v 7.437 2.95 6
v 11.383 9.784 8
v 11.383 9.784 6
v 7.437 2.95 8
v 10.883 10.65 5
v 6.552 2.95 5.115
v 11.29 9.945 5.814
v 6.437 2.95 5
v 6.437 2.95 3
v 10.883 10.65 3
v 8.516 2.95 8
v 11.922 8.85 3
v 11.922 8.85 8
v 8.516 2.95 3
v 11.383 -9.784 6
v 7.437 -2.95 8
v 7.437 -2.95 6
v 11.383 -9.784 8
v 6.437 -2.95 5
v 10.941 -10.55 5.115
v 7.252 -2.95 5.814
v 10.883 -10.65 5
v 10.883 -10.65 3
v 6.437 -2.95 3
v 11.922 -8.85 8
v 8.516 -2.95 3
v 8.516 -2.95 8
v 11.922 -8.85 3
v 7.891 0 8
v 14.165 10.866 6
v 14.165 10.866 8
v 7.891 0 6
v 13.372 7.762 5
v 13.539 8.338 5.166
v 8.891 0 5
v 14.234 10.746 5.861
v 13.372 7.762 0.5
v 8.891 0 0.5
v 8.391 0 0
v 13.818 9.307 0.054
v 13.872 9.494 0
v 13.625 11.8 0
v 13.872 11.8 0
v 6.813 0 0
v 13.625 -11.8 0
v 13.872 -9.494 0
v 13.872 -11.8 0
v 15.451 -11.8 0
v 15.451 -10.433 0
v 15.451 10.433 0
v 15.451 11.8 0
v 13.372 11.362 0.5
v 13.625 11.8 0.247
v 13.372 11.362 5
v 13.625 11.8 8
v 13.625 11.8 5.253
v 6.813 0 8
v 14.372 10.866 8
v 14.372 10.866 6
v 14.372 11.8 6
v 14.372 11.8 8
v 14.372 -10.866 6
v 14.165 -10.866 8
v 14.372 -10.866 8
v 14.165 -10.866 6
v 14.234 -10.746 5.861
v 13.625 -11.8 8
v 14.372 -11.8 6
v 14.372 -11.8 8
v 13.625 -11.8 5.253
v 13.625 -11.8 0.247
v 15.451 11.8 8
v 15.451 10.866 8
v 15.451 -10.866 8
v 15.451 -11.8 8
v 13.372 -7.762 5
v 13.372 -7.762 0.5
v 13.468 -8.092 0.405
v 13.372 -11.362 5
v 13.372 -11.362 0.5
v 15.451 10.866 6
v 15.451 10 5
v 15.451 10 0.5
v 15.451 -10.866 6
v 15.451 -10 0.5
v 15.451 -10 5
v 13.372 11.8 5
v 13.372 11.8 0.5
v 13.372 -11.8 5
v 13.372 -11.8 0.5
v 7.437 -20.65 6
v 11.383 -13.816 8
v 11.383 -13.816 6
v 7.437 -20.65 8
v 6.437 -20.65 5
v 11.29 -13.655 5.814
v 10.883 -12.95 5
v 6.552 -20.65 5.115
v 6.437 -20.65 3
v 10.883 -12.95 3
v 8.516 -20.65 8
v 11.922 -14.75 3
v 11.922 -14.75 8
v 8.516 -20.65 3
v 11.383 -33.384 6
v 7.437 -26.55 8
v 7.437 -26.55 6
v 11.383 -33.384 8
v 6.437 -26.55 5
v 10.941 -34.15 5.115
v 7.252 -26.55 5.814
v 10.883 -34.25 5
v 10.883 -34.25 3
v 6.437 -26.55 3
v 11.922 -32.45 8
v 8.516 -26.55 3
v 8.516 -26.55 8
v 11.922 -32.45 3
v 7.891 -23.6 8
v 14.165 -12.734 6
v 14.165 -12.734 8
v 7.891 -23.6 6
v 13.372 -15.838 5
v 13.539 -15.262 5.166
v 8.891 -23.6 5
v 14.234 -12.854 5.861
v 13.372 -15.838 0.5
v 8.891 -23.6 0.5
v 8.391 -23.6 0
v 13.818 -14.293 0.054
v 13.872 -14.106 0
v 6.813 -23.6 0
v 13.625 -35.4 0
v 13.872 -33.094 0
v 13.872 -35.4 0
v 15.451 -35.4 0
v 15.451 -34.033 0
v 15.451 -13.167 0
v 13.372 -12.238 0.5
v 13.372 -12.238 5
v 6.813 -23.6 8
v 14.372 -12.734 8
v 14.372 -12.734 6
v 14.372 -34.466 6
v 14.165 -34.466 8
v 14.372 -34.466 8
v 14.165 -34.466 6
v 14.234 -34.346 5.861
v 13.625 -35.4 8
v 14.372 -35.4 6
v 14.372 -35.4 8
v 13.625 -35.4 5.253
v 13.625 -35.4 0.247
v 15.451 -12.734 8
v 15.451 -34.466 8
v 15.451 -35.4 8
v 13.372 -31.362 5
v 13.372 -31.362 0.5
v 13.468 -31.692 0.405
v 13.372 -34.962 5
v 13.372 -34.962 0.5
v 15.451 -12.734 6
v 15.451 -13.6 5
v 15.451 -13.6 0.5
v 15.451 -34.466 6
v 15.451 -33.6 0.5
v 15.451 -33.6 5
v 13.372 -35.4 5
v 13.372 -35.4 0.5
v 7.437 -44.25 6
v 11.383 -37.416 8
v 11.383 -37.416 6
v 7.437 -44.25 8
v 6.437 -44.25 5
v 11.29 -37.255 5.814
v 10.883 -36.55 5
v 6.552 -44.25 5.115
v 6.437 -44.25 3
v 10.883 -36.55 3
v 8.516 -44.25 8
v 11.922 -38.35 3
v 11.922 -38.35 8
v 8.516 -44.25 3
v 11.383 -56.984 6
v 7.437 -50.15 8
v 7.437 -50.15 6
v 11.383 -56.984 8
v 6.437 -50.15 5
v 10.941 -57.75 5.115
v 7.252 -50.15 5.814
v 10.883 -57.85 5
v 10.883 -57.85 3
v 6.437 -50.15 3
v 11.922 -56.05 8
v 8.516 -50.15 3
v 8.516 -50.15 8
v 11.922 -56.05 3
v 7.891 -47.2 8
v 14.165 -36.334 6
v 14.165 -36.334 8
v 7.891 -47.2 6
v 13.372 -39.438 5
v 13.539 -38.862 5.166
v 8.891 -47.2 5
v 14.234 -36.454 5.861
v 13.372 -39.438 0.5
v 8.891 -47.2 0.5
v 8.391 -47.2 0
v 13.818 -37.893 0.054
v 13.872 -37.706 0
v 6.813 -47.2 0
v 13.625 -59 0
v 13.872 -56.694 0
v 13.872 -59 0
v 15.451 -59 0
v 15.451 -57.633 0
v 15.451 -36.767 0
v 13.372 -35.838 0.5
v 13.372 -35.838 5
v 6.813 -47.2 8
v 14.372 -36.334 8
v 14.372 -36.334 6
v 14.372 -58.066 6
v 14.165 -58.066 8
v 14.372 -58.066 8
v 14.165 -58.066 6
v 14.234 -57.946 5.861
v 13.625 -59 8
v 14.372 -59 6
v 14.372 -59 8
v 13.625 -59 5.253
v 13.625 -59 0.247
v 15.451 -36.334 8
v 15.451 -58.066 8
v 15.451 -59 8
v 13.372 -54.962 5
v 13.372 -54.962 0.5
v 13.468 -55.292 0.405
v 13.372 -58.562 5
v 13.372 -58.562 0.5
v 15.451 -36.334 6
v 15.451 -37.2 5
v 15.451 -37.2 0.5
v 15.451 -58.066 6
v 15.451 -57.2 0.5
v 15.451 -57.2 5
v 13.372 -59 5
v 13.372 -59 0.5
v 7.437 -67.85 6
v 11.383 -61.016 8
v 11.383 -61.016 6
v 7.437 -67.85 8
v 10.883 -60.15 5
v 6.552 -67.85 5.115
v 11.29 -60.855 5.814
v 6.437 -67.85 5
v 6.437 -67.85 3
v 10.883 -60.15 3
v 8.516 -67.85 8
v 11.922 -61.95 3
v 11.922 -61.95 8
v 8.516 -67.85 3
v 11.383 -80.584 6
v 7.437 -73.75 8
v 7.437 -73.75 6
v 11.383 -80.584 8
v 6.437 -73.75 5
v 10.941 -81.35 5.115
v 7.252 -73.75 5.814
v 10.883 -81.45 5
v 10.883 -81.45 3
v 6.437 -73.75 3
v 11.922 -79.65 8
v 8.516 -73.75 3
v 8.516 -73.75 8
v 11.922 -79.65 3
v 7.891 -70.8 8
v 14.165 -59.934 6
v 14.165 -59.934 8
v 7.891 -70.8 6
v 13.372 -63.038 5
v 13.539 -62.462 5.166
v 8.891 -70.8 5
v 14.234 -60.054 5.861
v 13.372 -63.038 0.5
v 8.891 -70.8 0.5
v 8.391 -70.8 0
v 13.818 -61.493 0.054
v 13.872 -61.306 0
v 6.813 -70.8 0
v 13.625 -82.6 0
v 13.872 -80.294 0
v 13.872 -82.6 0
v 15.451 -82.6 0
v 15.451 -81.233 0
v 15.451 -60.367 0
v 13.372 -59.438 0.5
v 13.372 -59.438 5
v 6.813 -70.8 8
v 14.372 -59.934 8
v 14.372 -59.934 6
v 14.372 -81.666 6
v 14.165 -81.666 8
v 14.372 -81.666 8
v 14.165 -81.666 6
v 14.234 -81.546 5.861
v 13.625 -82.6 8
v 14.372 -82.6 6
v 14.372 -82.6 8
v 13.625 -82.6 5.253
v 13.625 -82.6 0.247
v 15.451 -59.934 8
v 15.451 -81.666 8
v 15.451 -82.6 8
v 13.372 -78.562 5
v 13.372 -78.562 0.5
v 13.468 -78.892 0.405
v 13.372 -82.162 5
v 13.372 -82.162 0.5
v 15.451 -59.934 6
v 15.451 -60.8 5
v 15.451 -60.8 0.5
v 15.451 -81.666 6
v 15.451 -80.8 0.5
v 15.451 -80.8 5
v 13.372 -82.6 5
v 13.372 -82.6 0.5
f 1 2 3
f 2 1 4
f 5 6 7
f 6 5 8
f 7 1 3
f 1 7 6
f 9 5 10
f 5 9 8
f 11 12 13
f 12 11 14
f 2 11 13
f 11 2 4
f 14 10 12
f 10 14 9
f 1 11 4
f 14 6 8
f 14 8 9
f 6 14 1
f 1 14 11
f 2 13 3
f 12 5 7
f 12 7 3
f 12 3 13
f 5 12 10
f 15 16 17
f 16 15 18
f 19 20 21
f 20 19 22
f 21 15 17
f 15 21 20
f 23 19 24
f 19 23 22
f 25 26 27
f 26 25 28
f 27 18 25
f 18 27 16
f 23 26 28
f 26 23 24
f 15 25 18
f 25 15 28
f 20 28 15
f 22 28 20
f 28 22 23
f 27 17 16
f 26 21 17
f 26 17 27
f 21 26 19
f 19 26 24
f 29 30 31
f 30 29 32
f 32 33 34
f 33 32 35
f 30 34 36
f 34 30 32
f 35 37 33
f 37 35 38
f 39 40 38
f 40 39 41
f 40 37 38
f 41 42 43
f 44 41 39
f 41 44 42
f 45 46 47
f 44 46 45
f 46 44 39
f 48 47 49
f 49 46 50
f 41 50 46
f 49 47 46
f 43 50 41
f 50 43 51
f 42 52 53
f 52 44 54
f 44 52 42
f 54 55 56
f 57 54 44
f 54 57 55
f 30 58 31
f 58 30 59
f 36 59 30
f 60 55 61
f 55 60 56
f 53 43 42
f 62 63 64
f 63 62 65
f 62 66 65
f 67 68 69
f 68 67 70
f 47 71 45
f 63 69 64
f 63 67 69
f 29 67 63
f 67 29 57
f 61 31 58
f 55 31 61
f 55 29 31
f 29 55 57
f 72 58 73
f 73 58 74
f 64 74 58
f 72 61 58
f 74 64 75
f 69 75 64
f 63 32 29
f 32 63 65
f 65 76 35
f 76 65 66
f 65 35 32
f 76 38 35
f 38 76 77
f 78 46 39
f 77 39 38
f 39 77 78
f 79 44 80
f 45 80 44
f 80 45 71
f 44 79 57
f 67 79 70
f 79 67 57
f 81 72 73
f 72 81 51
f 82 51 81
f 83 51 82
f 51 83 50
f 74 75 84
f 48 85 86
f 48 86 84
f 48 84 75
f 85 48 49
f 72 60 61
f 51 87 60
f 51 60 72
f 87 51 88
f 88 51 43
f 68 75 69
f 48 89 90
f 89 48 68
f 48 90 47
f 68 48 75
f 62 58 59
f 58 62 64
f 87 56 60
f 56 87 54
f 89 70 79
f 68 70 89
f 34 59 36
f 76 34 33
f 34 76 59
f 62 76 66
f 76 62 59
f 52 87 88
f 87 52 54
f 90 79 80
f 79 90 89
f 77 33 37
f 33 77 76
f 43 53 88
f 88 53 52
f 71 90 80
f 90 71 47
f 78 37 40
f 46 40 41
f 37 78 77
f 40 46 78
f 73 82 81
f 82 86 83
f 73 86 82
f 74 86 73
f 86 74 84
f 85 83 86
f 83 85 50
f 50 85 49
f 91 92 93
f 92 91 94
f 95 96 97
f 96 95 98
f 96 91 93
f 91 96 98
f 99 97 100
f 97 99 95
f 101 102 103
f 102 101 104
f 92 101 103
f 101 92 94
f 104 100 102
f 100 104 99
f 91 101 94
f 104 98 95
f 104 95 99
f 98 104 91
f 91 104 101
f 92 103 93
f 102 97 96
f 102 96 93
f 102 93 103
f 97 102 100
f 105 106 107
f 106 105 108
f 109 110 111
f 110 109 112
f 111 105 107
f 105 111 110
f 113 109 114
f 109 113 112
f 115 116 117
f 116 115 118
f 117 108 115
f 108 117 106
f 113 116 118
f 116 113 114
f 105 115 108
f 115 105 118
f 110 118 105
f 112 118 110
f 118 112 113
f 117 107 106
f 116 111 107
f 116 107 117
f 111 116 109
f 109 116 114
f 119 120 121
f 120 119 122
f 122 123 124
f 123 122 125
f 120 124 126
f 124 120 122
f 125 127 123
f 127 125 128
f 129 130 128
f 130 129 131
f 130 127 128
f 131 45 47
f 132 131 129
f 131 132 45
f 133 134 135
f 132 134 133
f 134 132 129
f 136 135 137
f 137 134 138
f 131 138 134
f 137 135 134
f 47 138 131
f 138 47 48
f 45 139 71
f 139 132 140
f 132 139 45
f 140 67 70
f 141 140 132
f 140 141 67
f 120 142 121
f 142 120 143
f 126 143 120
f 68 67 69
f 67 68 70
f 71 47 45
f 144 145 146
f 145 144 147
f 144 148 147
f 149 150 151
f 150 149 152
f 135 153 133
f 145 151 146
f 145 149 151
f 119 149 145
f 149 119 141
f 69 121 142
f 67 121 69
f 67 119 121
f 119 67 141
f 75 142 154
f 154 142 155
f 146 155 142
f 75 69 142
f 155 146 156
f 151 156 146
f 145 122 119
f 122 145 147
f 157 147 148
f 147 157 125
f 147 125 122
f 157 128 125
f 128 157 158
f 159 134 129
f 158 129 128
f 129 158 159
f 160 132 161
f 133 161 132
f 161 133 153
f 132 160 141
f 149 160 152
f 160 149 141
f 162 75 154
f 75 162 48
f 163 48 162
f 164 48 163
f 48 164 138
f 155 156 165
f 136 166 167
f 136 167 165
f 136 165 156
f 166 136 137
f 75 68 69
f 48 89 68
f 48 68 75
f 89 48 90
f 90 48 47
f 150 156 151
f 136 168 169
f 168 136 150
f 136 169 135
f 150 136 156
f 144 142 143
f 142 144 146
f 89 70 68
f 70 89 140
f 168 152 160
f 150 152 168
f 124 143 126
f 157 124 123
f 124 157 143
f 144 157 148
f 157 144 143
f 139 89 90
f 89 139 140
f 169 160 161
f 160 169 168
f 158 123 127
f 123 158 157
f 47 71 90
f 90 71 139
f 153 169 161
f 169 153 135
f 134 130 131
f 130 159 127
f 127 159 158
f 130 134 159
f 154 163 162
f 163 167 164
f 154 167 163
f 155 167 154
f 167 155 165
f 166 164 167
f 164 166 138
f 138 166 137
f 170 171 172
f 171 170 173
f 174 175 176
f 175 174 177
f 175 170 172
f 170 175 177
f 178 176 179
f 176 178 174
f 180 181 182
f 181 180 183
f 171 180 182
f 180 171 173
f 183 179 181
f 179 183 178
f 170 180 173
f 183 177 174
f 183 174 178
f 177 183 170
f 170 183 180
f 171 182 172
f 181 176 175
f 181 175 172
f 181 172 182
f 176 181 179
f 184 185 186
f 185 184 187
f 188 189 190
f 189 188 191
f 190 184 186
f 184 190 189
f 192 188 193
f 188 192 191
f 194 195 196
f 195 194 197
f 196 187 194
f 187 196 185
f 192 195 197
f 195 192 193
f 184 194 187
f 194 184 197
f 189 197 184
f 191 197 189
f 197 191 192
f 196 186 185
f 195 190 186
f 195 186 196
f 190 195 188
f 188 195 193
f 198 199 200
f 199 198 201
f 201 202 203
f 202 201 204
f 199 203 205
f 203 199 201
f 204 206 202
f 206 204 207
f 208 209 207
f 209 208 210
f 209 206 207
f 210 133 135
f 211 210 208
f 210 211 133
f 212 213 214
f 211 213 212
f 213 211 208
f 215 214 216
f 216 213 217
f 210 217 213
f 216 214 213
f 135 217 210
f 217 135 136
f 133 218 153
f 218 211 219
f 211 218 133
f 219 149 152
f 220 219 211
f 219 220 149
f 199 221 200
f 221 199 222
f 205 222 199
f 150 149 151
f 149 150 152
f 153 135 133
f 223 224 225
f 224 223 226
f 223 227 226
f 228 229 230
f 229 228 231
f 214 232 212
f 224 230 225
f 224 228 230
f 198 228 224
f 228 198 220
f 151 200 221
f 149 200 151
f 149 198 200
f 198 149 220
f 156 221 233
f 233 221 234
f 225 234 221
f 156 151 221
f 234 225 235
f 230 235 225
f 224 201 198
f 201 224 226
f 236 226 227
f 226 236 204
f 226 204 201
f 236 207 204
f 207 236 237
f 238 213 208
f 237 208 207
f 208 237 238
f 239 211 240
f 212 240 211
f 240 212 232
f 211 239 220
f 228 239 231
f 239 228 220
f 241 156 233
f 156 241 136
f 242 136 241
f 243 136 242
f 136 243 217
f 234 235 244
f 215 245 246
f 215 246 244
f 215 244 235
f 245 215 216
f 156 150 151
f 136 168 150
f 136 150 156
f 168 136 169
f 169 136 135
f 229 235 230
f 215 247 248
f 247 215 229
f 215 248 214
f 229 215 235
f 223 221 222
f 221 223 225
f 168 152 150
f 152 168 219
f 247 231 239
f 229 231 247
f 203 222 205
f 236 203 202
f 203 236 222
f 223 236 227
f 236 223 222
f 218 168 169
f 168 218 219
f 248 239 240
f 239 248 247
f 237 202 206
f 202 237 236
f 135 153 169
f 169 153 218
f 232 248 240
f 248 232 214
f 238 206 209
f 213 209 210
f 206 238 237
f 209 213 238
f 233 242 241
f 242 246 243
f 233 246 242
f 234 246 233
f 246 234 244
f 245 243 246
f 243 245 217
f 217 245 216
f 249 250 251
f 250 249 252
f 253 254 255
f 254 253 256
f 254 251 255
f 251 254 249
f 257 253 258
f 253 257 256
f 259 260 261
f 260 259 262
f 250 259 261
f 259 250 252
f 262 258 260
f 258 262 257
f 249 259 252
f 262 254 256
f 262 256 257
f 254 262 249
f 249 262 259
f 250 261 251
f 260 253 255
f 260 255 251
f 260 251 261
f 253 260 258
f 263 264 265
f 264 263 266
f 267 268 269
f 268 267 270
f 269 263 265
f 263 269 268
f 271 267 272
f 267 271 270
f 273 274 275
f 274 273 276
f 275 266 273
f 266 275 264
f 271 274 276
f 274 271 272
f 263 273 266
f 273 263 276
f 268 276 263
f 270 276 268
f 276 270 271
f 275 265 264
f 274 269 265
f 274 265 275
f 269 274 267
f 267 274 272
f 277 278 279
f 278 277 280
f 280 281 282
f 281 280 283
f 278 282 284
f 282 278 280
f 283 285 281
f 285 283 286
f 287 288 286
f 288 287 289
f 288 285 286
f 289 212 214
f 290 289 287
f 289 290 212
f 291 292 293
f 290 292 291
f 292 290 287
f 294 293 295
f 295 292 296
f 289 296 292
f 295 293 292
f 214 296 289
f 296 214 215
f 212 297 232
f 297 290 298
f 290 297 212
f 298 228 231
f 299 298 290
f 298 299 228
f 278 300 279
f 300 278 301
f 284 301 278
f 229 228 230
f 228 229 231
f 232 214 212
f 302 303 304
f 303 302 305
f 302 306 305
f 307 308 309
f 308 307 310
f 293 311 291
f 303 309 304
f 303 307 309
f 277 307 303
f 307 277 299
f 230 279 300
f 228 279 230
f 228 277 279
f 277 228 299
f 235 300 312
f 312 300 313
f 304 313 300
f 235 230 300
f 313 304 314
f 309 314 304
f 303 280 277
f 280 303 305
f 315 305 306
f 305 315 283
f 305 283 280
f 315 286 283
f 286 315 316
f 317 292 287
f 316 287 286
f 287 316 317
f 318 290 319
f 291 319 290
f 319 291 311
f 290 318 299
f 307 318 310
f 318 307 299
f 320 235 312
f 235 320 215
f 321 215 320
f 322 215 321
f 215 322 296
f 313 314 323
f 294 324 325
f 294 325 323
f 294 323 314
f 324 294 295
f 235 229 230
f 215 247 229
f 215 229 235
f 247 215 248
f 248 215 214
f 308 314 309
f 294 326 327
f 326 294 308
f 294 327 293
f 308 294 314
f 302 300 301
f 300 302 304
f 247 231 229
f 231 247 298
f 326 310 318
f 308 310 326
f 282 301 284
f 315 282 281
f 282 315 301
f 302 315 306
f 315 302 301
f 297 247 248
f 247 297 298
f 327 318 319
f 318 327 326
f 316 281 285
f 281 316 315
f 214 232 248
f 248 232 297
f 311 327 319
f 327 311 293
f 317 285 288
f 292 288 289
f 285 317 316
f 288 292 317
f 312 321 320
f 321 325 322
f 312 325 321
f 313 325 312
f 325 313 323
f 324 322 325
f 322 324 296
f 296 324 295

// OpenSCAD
// file: honeycomb_element.scad
$fn = 50;

radius = 13.6;
diameter =  radius * 2;

h_inner = 10;
r_inner = h_inner * 2/sqrt(3);

h_outer = 10+1.8;
r_outer = h_outer * 2/sqrt(3);


h_thin = 10+1;
r_thin = h_thin * 2/sqrt(3);

total_height = 8;

small_value = 0.1;


clips_height = 5;
clips_offset = 0.5;
clips_side_offset = 0.00;


module basic_polygon() {
  polygon([[r_outer, total_height], [r_outer, 0], [r_inner+0.5, 0], [r_inner, 0.5], 
        [r_inner, total_height-3], [r_inner+1, total_height-2], [r_inner+1,total_height]]);    
}

module basic_model() {
  rotate_extrude($fn=6) {
      basic_polygon();
  }
}


module panel_with_clips(pin_1=false, pin_2=false, pin_3=false, pin_4=false, pin_5=false, pin_6=false, slot_1=false, slot_2=false, slot_3=false, slot_4=false, slot_5=false, slot_6=false) {

  difference() {
    basic_model();

    if (slot_1) {
      rotate([0, 0, 0])
        translate([0, -h_outer*2, total_height - (clips_height+clips_offset)/2])
          linear_extrude(height=clips_height+clips_offset, center=true)
            polygon([[clips_side_offset, h_outer/2], [-clips_side_offset, h_outer/2], [-r_outer/2-clips_side_offset, h_outer*1.5], [r_outer/2+clips_side_offset, h_outer*1.5]]);
    }

    if (slot_2) {
      rotate([0, 0, 60])
        translate([0, -h_outer*2, total_height - (clips_height+clips_offset)/2])
          linear_extrude(height=clips_height+clips_offset, center=true)
            polygon([[clips_side_offset, h_outer/2], [-clips_side_offset, h_outer/2], [-r_outer/2-clips_side_offset, h_outer*1.5], [r_outer/2+clips_side_offset, h_outer*1.5]]);
    }



    if (slot_3) {
      rotate([0, 0, 120])
        translate([0, -h_outer*2, total_height - (clips_height+clips_offset)/2])
          linear_extrude(height=clips_height+clips_offset, center=true)
            polygon([[clips_side_offset, h_outer/2], [-clips_side_offset, h_outer/2], [-r_outer/2-clips_side_offset, h_outer*1.5], [r_outer/2+clips_side_offset, h_outer*1.5]]);
    }

    if (slot_4) {
      rotate([0, 0, 180])
        translate([0, -h_outer*2, total_height - (clips_height+clips_offset)/2])
          linear_extrude(height=clips_height+clips_offset, center=true)
            polygon([[clips_side_offset, h_outer/2], [-clips_side_offset, h_outer/2], [-r_outer/2-clips_side_offset, h_outer*1.5], [r_outer/2+clips_side_offset, h_outer*1.5]]);
    }

    if (slot_5) {
      rotate([0, 0, 240])
        translate([0, -h_outer*2, total_height - (clips_height+clips_offset)/2])
          linear_extrude(height=clips_height+clips_offset, center=true)
            polygon([[clips_side_offset, h_outer/2], [-clips_side_offset, h_outer/2], [-r_outer/2-clips_side_offset, h_outer*1.5], [r_outer/2+clips_side_offset, h_outer*1.5]]);
    }

    if (slot_6) {
      rotate([0, 0, 300])
        translate([0, -h_outer*2, total_height - (clips_height+clips_offset)/2])
          linear_extrude(height=clips_height+clips_offset, center=true)
            polygon([[clips_side_offset, h_outer/2], [-clips_side_offset, h_outer/2], [-r_outer/2-clips_side_offset, h_outer*1.5], [r_outer/2+clips_side_offset, h_outer*1.5]]);
    }
  }


  if (pin_1) {
    intersection() {
      translate([0,-h_outer*2, 0])
        basic_model();
      translate([0, 0, total_height - clips_height/2]) {
        rotate([0, 0, -180])  
          linear_extrude(height=clips_height, center=true)
            polygon([[0, h_outer/2], [-r_outer/2, h_outer*1.5], [r_outer/2, h_outer*1.5]]);  
      }
    }
  }

  if (pin_2) {
    intersection() {
      translate([r_outer*1.5,-h_outer, 0])
        basic_model();
      translate([0, 0, total_height - clips_height/2]) {
        rotate([0, 0, -120])  
          linear_extrude(height=clips_height, center=true)
            polygon([[0, h_outer/2], [-r_outer/2, h_outer*1.5], [r_outer/2, h_outer*1.5]]);  
      }
    }
  }


  if (pin_3) {
    intersection() {
      translate([r_outer*1.5,h_outer, 0])
        basic_model();
      translate([0, 0, total_height - clips_height/2]) {
        rotate([0, 0, -60])  
          linear_extrude(height=clips_height, center=true)
            polygon([[0, h_outer/2], [-r_outer/2, h_outer*1.5], [r_outer/2, h_outer*1.5]]);  
      }
    }
  }

  if (pin_4) {
    intersection() {
      translate([0, h_outer*2, 0])
        basic_model();

      translate([0, 0, total_height - clips_height/2]) {
        linear_extrude(height=clips_height, center=true)
          polygon([[0, h_outer/2], [-r_outer/2, h_outer*1.5], [r_outer/2, h_outer*1.5]]);
      }  
    }
  }

  if (pin_5) {
    intersection() {
      translate([-r_outer*1.5,h_outer, 0])
        basic_model();
      translate([0, 0, total_height - clips_height/2]) {
        rotate([0, 0, 60])  
          linear_extrude(height=clips_height, center=true)
            polygon([[0, h_outer/2], [-r_outer/2, h_outer*1.5], [r_outer/2, h_outer*1.5]]);  
      }
    }
  }
  
  if (pin_6) {
    intersection() {
      translate([-r_outer*1.5, -h_outer, 0])
        basic_model();

      translate([0, 0, total_height - clips_height/2]) {
        rotate([0, 0, 120])  
          linear_extrude(height=clips_height, center=true)
            polygon([[0, h_outer/2], [-r_outer/2, h_outer*1.5], [r_outer/2, h_outer*1.5]]);  
      }
    }
  }
}

// end honeycomb_element.scad
// main file
$fn = 50;

h_outer = 10+1.8;
r_outer = h_outer * 2/sqrt(3);



use <honeycomb_element.scad>;

module perimeter_left_item(pin_5=true, pin_6=true) {
  difference() {
      translate([r_outer * 1.5, 0, 0])
        panel_with_clips(pin_6=pin_6, pin_5=pin_5);
      translate([50+r_outer * 1.5-r_outer/2 + (r_outer-h_outer), 0, 0])
        cube([100, 100, 100], center = true);
  }
  translate([0 + r_outer-h_outer, 0, 0])
    rotate([90, 0, 0])
      linear_extrude(height = h_outer * 2, center=true)
        basic_polygon();
}



module perimeter_left() {  
    
    for (i = [0:3]) {       
      translate([0, -h_outer*2*i, 0])
        perimeter_left_item();   
    }
}



perimeter_left();
